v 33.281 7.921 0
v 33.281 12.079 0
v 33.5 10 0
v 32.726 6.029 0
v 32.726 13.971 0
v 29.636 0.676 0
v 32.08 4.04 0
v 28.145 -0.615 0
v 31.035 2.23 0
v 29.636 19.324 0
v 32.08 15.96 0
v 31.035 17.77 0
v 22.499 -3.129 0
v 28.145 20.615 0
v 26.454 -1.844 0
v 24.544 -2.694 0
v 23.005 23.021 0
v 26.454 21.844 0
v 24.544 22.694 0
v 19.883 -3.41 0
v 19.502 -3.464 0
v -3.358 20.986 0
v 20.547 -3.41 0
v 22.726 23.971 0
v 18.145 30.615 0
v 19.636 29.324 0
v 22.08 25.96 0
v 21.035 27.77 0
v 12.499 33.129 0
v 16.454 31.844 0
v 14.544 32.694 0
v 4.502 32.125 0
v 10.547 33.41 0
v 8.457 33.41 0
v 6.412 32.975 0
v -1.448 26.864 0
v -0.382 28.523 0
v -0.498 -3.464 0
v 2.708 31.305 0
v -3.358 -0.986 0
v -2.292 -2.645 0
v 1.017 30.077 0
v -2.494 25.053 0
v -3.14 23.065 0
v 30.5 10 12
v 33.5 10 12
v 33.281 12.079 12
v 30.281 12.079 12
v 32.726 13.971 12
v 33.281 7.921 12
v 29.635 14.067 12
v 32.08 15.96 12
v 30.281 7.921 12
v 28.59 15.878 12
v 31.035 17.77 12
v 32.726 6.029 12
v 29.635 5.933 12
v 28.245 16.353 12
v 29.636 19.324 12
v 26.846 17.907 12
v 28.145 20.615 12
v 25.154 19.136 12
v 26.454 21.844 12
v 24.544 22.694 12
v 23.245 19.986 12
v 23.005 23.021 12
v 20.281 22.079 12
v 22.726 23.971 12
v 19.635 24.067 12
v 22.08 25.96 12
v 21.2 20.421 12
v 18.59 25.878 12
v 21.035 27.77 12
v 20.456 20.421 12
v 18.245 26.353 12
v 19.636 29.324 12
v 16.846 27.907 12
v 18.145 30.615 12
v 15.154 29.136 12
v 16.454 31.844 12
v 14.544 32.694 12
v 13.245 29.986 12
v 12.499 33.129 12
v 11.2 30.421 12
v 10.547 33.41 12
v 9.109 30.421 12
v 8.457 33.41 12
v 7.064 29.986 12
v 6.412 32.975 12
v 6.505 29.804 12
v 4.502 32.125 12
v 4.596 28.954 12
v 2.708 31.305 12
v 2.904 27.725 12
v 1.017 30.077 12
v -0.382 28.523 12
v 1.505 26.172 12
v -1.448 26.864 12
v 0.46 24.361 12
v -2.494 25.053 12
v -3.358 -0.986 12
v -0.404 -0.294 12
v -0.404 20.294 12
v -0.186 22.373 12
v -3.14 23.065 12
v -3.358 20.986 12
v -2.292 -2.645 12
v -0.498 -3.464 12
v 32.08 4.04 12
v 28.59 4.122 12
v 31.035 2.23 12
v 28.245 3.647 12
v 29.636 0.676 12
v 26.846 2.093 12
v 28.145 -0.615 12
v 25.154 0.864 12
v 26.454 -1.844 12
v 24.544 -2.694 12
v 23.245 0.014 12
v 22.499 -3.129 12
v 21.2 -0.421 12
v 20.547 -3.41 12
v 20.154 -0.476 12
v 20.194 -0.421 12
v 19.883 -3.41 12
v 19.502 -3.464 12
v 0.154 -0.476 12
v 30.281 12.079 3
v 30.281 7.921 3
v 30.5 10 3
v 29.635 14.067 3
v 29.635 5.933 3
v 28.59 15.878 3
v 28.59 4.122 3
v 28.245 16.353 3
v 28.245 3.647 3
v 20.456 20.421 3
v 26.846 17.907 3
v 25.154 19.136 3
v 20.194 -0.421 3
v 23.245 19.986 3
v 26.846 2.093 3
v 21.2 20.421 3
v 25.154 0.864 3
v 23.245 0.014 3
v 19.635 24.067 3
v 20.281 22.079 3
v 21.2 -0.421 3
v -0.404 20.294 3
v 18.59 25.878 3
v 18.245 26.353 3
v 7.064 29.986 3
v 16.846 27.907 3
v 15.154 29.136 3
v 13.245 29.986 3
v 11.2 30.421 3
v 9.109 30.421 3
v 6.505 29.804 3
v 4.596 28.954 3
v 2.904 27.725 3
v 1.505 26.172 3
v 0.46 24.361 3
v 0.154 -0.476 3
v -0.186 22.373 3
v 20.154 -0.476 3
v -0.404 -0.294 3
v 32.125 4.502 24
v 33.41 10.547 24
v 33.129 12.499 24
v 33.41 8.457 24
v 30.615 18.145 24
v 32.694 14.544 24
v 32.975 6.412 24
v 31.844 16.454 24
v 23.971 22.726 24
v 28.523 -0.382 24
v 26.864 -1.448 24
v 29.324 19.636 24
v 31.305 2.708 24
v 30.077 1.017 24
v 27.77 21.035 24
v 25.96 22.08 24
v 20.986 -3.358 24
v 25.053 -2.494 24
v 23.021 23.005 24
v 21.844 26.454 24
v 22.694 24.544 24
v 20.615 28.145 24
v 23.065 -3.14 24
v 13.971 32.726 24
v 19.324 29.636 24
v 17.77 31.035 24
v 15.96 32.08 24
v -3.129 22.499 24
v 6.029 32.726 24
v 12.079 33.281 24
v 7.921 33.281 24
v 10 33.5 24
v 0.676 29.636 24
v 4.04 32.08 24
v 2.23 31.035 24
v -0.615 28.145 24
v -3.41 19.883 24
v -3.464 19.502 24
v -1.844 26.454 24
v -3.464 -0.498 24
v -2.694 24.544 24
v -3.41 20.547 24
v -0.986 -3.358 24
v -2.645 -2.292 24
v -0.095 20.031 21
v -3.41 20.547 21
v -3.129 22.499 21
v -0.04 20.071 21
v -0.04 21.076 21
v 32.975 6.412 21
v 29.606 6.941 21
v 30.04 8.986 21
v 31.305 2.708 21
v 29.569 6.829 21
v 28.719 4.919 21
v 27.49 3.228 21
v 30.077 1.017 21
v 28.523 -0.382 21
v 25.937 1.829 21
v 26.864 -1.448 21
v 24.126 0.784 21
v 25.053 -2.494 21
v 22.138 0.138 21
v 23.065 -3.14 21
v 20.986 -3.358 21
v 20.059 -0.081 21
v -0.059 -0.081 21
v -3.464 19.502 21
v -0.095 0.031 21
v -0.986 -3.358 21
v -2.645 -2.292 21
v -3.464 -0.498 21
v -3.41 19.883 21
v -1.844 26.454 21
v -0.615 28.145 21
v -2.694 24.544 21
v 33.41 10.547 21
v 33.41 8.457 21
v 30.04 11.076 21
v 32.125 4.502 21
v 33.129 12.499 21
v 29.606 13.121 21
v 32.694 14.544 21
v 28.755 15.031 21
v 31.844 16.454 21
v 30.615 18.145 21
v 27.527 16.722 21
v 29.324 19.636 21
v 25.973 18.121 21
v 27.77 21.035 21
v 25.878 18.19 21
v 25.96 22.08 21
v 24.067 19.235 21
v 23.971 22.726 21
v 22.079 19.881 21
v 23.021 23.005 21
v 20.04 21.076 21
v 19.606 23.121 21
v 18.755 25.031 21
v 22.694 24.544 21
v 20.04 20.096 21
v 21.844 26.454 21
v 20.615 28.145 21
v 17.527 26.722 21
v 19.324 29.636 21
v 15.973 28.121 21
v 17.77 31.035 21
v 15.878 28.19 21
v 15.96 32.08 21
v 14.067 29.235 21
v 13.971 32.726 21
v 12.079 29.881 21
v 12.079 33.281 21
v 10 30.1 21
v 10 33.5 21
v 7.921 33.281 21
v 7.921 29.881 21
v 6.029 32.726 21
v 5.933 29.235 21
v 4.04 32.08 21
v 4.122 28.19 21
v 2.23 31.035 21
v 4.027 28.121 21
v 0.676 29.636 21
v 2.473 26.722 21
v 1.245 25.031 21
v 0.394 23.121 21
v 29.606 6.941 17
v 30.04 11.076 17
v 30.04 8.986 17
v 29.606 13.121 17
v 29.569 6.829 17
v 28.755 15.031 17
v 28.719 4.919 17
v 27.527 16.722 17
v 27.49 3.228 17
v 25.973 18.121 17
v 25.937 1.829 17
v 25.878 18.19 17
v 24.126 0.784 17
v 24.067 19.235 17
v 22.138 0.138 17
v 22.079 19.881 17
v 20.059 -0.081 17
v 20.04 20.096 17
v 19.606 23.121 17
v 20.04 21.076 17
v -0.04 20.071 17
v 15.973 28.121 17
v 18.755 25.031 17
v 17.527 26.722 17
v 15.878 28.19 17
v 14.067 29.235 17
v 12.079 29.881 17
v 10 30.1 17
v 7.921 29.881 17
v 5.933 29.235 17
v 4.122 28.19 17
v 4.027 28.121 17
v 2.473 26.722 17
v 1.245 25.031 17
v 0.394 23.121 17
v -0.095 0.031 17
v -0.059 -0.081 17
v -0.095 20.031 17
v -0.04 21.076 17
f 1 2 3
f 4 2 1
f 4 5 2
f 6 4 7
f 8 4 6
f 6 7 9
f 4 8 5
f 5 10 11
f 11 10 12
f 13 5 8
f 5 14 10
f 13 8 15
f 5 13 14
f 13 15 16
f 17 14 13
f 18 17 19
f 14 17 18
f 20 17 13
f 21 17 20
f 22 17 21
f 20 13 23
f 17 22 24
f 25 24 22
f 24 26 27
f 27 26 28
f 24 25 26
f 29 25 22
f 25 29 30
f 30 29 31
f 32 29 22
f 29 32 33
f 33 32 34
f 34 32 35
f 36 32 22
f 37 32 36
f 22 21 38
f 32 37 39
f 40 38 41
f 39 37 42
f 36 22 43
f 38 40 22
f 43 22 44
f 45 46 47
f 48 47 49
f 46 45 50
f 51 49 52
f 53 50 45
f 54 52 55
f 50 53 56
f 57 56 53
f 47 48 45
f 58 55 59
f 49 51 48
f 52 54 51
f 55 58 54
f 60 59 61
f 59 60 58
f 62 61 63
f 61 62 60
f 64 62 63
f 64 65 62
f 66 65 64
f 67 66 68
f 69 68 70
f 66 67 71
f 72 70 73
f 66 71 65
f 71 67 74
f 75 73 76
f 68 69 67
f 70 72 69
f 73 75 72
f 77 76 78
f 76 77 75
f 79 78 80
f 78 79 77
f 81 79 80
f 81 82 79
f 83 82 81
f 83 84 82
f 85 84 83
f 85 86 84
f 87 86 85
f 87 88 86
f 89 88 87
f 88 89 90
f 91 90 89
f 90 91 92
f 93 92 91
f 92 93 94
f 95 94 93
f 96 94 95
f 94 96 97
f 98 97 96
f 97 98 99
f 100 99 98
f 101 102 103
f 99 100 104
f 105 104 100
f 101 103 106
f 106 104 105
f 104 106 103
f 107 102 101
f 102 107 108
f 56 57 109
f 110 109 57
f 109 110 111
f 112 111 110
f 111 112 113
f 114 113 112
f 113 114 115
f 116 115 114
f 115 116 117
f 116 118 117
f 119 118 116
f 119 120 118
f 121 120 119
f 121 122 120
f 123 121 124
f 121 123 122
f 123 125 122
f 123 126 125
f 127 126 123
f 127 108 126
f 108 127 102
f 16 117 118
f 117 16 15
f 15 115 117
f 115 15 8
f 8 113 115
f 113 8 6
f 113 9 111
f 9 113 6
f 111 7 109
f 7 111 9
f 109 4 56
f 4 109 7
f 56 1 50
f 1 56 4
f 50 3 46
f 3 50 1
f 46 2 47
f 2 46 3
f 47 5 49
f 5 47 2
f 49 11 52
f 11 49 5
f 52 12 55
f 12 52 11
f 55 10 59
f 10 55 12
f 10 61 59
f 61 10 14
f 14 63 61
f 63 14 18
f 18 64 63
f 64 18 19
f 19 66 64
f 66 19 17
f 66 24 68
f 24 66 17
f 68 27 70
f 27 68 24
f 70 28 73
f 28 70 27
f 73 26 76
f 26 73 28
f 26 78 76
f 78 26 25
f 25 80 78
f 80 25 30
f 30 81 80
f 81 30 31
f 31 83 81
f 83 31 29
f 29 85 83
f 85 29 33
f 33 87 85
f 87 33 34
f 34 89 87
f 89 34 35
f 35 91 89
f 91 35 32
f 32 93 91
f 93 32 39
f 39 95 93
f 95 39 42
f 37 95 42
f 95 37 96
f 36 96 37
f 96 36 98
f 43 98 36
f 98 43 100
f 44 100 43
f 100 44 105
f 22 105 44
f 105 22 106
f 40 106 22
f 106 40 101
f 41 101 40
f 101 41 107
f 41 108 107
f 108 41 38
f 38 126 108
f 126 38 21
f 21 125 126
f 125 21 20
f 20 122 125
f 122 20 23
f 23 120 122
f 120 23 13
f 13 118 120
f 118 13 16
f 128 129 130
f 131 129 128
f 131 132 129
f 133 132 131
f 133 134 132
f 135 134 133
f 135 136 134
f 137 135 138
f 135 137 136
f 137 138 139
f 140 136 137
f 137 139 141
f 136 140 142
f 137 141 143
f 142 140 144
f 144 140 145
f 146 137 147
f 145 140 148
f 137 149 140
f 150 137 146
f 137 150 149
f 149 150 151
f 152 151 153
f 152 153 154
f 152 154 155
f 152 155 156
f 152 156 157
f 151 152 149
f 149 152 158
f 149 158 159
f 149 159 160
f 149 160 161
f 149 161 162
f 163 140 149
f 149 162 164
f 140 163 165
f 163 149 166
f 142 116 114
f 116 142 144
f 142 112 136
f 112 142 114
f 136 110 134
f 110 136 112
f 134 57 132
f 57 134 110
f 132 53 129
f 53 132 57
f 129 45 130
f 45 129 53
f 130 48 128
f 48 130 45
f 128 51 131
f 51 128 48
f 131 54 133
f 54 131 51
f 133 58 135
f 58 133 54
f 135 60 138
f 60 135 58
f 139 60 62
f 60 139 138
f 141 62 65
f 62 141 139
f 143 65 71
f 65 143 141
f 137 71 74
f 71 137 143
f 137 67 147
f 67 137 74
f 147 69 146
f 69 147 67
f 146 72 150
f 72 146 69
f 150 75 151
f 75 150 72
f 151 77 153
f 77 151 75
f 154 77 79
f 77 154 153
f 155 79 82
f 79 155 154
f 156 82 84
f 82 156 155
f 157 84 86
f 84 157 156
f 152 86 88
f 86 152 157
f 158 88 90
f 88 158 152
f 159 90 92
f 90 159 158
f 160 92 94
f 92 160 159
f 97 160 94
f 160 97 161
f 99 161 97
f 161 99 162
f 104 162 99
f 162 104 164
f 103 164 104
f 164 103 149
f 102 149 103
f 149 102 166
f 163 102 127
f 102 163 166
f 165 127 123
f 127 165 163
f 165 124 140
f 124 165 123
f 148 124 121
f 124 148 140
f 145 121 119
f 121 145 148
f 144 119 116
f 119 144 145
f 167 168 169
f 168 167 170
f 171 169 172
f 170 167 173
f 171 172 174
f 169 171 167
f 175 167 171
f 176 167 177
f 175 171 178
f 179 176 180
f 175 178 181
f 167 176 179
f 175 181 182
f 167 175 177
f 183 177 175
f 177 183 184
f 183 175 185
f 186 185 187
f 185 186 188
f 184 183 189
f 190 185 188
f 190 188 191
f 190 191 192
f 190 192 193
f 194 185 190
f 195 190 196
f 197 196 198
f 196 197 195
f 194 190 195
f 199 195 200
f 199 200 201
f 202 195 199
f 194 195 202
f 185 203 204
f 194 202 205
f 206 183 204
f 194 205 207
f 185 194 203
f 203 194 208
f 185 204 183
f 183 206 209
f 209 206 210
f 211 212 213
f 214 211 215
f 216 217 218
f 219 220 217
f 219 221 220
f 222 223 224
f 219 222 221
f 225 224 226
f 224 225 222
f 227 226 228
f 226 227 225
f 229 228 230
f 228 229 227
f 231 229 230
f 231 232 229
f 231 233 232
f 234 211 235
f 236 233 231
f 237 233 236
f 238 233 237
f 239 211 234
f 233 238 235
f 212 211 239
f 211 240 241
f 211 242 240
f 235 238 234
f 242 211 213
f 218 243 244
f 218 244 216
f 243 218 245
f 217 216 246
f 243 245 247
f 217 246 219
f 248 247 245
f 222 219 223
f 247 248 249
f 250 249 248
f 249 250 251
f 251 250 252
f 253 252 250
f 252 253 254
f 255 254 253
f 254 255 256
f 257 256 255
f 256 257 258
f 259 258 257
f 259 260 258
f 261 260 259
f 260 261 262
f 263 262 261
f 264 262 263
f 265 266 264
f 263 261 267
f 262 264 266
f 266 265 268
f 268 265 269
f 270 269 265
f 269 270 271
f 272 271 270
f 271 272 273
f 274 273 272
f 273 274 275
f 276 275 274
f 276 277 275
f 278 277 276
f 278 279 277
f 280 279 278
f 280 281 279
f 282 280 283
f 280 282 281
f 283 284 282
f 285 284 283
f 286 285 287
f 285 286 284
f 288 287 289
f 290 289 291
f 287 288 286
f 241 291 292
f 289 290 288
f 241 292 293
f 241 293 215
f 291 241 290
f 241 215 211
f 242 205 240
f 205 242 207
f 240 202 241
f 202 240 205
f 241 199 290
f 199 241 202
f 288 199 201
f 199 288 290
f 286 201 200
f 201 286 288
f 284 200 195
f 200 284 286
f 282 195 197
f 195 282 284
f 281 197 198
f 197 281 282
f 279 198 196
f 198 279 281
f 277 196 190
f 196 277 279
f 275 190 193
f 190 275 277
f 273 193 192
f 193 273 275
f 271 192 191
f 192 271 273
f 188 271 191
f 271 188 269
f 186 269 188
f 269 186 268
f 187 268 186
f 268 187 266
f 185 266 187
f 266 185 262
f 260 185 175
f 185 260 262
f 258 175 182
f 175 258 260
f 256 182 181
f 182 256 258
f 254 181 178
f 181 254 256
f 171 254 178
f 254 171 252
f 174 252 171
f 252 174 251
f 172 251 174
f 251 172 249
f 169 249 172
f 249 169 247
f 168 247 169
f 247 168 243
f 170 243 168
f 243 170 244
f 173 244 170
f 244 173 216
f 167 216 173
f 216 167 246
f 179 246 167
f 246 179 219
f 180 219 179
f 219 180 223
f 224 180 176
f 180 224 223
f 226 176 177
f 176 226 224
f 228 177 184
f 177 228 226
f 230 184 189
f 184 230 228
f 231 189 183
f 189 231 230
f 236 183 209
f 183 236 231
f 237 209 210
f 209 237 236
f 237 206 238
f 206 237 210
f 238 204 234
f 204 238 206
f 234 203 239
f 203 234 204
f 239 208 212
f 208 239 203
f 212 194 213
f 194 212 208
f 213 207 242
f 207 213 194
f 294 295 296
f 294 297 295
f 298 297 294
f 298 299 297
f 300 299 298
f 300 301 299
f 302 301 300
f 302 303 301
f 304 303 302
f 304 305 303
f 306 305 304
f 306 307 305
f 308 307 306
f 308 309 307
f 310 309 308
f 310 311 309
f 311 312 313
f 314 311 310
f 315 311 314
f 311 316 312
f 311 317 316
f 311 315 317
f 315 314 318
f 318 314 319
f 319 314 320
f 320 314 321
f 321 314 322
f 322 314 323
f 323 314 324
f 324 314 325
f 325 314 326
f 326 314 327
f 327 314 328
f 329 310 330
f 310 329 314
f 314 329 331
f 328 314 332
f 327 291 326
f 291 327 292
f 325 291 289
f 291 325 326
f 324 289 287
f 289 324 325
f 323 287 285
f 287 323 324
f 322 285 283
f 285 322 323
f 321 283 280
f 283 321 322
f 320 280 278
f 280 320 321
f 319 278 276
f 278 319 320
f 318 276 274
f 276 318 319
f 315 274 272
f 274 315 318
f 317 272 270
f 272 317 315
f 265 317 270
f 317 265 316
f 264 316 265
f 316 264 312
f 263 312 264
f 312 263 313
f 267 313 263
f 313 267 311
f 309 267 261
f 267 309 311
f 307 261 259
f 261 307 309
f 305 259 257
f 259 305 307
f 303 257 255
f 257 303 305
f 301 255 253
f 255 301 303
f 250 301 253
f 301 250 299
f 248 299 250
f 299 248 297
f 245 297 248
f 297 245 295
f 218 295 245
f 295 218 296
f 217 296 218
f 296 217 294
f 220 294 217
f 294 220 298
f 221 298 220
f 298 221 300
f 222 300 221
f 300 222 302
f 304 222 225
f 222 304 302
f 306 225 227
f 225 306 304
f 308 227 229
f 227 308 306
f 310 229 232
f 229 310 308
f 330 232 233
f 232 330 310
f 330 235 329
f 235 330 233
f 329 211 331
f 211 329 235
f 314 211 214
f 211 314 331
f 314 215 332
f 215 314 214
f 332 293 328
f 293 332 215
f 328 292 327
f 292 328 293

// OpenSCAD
module heart_shape(size) {
      union() {
        square(size,size);
        translate([size/2,size,0]) circle(size/2);
        translate([size,size/2,0]) circle(size/2);
    }
}

module heart(size,thickness,height) {
   linear_extrude(height=height) 
          minkowski() {
               heart_shape(size);
               circle(thickness);
        }
}

module heart_box(size,height,thickness,clearance) {
    difference() {
         heart(size,thickness + clearance,height);
         translate([0,0,thickness])  heart(size,clearance,height);
    }
}
 
module heart_lid(size,thickness,depth,clearance) {
  union()  {
        heart(size,thickness+clearance,thickness);
        translate([0,0,thickness]) heart(size,0.1, depth); 
  }
}
 
module heart_thing(size,height,thickness,depth,clearance) {
    union() {
       heart_box(size,height,thickness,clearance);
   //   rotate([0,0,180]) translate ([10,10,0])  // to place alongside for printing
      rotate([180,0,90]) translate ([0,0,- 2 * height ])  // to fit over box to check
          heart_lid(size,thickness,depth,clearance);
  }
}

heart_thing(20,12,3,4,0.5);
